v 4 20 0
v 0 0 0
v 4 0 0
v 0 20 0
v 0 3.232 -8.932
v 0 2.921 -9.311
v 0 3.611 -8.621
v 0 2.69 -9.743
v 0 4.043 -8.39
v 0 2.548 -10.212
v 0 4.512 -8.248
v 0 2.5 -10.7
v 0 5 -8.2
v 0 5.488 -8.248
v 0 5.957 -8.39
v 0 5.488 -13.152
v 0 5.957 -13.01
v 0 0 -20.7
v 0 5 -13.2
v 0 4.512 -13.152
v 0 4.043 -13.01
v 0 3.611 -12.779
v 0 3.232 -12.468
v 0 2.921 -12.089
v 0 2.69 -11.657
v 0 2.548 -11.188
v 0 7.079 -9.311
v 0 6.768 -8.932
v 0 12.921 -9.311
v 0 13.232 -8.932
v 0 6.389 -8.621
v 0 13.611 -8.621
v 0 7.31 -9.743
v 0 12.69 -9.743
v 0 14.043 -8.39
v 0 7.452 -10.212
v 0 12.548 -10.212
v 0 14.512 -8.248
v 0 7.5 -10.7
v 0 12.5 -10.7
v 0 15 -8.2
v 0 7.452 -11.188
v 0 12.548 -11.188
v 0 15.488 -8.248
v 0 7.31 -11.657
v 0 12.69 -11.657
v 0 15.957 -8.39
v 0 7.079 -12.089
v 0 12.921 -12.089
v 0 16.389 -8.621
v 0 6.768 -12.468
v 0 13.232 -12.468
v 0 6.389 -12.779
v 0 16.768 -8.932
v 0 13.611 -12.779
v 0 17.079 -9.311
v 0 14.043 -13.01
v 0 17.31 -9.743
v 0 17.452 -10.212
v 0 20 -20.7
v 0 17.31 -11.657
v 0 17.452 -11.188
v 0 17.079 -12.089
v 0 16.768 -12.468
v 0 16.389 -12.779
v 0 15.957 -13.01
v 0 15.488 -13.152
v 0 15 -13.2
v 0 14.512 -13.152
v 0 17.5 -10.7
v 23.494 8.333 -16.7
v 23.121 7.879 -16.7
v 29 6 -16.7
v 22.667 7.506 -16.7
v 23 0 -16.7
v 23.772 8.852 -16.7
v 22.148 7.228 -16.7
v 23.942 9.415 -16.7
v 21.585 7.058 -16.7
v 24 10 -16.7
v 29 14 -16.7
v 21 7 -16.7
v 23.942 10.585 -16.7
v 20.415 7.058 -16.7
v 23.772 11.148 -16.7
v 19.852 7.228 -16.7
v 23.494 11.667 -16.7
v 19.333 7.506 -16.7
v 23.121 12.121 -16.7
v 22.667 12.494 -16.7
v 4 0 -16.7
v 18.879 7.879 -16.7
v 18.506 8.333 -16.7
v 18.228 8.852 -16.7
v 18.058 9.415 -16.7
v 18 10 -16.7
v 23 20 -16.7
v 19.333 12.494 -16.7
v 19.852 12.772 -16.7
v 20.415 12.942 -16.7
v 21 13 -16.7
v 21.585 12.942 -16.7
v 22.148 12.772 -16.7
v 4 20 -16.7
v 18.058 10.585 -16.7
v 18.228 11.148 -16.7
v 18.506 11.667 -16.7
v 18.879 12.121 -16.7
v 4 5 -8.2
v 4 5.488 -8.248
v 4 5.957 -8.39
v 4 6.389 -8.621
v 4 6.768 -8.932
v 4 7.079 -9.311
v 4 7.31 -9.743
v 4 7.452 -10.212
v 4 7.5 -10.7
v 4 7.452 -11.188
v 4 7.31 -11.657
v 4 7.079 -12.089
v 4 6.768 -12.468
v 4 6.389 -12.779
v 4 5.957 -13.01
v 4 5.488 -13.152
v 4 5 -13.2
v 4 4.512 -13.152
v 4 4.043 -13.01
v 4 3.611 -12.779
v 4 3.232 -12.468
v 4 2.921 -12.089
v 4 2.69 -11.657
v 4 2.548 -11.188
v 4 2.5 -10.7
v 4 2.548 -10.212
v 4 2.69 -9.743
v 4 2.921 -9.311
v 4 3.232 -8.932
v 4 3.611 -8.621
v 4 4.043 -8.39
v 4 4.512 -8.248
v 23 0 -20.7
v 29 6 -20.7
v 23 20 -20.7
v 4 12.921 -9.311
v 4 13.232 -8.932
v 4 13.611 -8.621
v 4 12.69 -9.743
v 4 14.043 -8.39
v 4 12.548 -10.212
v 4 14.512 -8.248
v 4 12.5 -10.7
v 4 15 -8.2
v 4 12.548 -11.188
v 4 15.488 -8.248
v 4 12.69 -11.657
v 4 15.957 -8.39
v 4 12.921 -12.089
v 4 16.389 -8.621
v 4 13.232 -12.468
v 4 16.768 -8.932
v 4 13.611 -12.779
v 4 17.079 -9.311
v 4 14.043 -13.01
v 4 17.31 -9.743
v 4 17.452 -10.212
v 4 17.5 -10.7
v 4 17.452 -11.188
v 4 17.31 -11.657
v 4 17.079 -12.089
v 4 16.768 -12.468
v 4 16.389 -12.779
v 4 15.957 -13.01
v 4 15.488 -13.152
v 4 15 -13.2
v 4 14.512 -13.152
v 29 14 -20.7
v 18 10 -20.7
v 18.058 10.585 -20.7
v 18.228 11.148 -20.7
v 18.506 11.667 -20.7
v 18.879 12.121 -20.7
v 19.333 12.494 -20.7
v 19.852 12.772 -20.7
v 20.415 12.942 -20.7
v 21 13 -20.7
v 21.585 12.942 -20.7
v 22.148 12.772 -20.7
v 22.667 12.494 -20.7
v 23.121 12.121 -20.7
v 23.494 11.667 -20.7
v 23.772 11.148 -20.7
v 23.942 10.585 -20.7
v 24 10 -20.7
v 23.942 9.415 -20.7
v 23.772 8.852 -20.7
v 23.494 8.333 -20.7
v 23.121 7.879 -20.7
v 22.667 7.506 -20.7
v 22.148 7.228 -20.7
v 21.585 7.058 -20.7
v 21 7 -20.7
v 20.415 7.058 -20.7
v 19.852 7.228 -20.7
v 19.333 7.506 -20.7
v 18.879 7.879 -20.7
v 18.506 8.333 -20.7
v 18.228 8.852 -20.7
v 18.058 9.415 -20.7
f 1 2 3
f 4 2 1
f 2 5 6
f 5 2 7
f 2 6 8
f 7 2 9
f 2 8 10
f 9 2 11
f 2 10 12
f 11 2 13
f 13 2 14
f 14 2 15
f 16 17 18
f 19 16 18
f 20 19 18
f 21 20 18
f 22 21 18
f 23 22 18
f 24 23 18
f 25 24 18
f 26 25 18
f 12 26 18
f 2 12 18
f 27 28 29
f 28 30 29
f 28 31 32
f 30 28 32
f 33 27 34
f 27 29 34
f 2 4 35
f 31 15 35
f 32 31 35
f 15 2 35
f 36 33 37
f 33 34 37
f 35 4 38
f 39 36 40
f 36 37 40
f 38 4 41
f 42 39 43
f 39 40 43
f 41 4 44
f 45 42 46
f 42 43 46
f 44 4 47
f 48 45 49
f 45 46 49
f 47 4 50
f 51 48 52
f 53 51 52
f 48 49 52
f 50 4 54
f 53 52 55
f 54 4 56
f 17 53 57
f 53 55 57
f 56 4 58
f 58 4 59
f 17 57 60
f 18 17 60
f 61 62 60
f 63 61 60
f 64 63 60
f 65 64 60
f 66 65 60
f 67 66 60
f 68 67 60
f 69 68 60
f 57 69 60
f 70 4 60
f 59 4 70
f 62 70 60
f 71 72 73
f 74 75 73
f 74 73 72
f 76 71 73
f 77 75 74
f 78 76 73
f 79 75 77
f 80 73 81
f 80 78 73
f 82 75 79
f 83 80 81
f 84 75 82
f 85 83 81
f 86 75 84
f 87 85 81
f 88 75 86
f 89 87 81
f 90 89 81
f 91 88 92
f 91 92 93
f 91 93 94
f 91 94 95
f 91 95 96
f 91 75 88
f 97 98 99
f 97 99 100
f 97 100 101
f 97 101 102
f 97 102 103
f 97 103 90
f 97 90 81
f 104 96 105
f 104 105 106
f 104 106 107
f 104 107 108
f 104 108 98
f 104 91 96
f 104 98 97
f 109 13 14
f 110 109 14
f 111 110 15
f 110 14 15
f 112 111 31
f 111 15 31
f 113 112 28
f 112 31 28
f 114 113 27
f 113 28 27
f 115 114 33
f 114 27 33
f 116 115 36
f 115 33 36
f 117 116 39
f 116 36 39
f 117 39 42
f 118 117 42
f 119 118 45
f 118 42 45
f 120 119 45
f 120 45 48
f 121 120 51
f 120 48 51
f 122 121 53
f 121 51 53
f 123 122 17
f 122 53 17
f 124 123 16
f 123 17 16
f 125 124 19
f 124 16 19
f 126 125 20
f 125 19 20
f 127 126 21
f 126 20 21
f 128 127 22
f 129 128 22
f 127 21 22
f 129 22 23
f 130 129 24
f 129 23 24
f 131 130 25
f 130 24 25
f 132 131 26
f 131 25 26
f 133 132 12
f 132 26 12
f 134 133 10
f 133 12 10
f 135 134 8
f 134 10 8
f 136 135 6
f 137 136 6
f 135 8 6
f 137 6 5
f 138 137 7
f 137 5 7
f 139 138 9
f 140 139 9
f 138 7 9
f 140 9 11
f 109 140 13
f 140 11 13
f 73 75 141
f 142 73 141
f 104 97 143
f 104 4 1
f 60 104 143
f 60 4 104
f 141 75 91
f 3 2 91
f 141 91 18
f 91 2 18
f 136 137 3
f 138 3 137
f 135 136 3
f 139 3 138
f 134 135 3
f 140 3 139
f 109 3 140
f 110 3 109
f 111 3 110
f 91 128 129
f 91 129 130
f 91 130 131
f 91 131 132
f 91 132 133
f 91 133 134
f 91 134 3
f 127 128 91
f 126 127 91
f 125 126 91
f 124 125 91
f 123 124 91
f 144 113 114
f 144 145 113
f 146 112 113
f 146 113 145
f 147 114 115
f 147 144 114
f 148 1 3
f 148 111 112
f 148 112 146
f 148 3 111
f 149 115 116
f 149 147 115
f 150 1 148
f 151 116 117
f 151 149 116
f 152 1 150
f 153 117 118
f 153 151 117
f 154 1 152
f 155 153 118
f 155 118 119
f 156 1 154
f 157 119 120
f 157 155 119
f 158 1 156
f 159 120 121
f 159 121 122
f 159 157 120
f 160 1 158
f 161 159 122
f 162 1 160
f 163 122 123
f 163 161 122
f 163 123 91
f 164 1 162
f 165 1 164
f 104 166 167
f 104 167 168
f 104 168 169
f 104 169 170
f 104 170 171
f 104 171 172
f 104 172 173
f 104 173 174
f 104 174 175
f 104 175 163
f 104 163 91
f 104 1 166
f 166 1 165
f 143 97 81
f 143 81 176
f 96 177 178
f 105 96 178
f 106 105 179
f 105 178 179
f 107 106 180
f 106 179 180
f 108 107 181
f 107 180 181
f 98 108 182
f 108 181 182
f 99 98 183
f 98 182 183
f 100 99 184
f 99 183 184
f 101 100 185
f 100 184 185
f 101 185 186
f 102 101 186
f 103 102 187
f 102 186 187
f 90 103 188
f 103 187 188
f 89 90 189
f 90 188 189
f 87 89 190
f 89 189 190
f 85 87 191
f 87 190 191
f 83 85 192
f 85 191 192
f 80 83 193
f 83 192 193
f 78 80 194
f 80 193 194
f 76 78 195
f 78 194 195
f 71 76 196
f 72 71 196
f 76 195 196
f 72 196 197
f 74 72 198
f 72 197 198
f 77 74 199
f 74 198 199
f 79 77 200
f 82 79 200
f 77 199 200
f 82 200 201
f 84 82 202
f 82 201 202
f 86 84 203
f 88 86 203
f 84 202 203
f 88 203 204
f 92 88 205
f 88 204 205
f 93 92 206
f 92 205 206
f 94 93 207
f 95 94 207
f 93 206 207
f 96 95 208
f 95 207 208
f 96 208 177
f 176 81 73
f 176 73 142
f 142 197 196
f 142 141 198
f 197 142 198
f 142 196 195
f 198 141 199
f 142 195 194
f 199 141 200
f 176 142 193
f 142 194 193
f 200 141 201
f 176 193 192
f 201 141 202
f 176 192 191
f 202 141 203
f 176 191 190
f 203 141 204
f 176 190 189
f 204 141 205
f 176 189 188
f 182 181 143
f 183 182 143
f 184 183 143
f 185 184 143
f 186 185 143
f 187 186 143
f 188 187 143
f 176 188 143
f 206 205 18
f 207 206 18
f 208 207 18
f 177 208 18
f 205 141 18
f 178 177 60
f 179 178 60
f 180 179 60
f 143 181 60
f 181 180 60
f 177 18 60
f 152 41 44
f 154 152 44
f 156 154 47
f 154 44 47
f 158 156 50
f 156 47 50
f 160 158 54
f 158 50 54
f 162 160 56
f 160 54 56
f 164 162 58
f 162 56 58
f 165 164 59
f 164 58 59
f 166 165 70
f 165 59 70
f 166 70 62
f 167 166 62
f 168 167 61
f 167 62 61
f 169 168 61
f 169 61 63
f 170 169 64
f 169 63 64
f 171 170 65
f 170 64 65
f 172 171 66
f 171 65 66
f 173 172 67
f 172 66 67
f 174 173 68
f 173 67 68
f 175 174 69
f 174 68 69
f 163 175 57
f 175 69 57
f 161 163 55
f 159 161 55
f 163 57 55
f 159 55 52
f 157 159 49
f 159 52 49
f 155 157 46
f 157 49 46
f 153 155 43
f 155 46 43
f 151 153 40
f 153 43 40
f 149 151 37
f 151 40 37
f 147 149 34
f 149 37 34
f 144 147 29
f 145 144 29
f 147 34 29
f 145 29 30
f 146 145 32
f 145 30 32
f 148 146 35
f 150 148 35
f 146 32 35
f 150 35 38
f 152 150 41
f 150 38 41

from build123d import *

# Parameters (mm, degrees)
SKETCH_1_W          = 20.7
SKETCH_1_H          = 20
EXTRUDE_1_DEPTH     = 4
SKETCH_2_W          = 4
SKETCH_2_H          = 20
EXTRUDE_2_DEPTH     = 25
SKETCH_3_R          = 2.5
CUT_EXTRUDE_1_DEPTH = 4
SKETCH_4_R          = 3
CUT_EXTRUDE_2_DEPTH = 4
CHAMFER_1_SIZE      = 6


with BuildPart() as part:
    # Эскиз1 → Бобышка-Вытянуть1 (new body)
    with BuildSketch(Plane(origin=(0, 0, 0), x_dir=(0, 0, -1), z_dir=(1, 0, 0))):
        with Locations((10.35, 10)):
            Rectangle(SKETCH_1_W, SKETCH_1_H)
    extrude(amount=EXTRUDE_1_DEPTH)

    # Эскиз2 → Бобышка-Вытянуть2 (add)
    with BuildSketch(Plane(origin=(4, 0, 0), x_dir=(0, 0, -1), z_dir=(1, 0, 0))):
        with Locations((18.7, 10)):
            Rectangle(SKETCH_2_W, SKETCH_2_H)
    extrude(amount=EXTRUDE_2_DEPTH)

    # Эскиз3 → Вырез-Вытянуть1 (cut)
    with BuildSketch(Plane.ZY):
        with Locations((-10.7, 15)):
            Circle(SKETCH_3_R)
        with Locations((-10.7, 5)):
            Circle(SKETCH_3_R)
    extrude(amount=-CUT_EXTRUDE_1_DEPTH, mode=Mode.SUBTRACT)

    # Эскиз4 → Вырез-Вытянуть2 (cut)
    with BuildSketch(Plane(origin=(0, 0, -20.7), x_dir=(-1, 0, 0), z_dir=(0, 0, -1))):
        with Locations((-21, 10)):
            Circle(SKETCH_4_R)
    extrude(amount=-CUT_EXTRUDE_2_DEPTH, mode=Mode.SUBTRACT)

    # Фаска1
    chamfer_1_edges = [part.edges().sort_by_distance(p)[0] for p in [
        (29, 0, -18.7),
        (29, 20, -18.7),
    ]]
    chamfer(chamfer_1_edges, length=CHAMFER_1_SIZE)


solid = part.part
